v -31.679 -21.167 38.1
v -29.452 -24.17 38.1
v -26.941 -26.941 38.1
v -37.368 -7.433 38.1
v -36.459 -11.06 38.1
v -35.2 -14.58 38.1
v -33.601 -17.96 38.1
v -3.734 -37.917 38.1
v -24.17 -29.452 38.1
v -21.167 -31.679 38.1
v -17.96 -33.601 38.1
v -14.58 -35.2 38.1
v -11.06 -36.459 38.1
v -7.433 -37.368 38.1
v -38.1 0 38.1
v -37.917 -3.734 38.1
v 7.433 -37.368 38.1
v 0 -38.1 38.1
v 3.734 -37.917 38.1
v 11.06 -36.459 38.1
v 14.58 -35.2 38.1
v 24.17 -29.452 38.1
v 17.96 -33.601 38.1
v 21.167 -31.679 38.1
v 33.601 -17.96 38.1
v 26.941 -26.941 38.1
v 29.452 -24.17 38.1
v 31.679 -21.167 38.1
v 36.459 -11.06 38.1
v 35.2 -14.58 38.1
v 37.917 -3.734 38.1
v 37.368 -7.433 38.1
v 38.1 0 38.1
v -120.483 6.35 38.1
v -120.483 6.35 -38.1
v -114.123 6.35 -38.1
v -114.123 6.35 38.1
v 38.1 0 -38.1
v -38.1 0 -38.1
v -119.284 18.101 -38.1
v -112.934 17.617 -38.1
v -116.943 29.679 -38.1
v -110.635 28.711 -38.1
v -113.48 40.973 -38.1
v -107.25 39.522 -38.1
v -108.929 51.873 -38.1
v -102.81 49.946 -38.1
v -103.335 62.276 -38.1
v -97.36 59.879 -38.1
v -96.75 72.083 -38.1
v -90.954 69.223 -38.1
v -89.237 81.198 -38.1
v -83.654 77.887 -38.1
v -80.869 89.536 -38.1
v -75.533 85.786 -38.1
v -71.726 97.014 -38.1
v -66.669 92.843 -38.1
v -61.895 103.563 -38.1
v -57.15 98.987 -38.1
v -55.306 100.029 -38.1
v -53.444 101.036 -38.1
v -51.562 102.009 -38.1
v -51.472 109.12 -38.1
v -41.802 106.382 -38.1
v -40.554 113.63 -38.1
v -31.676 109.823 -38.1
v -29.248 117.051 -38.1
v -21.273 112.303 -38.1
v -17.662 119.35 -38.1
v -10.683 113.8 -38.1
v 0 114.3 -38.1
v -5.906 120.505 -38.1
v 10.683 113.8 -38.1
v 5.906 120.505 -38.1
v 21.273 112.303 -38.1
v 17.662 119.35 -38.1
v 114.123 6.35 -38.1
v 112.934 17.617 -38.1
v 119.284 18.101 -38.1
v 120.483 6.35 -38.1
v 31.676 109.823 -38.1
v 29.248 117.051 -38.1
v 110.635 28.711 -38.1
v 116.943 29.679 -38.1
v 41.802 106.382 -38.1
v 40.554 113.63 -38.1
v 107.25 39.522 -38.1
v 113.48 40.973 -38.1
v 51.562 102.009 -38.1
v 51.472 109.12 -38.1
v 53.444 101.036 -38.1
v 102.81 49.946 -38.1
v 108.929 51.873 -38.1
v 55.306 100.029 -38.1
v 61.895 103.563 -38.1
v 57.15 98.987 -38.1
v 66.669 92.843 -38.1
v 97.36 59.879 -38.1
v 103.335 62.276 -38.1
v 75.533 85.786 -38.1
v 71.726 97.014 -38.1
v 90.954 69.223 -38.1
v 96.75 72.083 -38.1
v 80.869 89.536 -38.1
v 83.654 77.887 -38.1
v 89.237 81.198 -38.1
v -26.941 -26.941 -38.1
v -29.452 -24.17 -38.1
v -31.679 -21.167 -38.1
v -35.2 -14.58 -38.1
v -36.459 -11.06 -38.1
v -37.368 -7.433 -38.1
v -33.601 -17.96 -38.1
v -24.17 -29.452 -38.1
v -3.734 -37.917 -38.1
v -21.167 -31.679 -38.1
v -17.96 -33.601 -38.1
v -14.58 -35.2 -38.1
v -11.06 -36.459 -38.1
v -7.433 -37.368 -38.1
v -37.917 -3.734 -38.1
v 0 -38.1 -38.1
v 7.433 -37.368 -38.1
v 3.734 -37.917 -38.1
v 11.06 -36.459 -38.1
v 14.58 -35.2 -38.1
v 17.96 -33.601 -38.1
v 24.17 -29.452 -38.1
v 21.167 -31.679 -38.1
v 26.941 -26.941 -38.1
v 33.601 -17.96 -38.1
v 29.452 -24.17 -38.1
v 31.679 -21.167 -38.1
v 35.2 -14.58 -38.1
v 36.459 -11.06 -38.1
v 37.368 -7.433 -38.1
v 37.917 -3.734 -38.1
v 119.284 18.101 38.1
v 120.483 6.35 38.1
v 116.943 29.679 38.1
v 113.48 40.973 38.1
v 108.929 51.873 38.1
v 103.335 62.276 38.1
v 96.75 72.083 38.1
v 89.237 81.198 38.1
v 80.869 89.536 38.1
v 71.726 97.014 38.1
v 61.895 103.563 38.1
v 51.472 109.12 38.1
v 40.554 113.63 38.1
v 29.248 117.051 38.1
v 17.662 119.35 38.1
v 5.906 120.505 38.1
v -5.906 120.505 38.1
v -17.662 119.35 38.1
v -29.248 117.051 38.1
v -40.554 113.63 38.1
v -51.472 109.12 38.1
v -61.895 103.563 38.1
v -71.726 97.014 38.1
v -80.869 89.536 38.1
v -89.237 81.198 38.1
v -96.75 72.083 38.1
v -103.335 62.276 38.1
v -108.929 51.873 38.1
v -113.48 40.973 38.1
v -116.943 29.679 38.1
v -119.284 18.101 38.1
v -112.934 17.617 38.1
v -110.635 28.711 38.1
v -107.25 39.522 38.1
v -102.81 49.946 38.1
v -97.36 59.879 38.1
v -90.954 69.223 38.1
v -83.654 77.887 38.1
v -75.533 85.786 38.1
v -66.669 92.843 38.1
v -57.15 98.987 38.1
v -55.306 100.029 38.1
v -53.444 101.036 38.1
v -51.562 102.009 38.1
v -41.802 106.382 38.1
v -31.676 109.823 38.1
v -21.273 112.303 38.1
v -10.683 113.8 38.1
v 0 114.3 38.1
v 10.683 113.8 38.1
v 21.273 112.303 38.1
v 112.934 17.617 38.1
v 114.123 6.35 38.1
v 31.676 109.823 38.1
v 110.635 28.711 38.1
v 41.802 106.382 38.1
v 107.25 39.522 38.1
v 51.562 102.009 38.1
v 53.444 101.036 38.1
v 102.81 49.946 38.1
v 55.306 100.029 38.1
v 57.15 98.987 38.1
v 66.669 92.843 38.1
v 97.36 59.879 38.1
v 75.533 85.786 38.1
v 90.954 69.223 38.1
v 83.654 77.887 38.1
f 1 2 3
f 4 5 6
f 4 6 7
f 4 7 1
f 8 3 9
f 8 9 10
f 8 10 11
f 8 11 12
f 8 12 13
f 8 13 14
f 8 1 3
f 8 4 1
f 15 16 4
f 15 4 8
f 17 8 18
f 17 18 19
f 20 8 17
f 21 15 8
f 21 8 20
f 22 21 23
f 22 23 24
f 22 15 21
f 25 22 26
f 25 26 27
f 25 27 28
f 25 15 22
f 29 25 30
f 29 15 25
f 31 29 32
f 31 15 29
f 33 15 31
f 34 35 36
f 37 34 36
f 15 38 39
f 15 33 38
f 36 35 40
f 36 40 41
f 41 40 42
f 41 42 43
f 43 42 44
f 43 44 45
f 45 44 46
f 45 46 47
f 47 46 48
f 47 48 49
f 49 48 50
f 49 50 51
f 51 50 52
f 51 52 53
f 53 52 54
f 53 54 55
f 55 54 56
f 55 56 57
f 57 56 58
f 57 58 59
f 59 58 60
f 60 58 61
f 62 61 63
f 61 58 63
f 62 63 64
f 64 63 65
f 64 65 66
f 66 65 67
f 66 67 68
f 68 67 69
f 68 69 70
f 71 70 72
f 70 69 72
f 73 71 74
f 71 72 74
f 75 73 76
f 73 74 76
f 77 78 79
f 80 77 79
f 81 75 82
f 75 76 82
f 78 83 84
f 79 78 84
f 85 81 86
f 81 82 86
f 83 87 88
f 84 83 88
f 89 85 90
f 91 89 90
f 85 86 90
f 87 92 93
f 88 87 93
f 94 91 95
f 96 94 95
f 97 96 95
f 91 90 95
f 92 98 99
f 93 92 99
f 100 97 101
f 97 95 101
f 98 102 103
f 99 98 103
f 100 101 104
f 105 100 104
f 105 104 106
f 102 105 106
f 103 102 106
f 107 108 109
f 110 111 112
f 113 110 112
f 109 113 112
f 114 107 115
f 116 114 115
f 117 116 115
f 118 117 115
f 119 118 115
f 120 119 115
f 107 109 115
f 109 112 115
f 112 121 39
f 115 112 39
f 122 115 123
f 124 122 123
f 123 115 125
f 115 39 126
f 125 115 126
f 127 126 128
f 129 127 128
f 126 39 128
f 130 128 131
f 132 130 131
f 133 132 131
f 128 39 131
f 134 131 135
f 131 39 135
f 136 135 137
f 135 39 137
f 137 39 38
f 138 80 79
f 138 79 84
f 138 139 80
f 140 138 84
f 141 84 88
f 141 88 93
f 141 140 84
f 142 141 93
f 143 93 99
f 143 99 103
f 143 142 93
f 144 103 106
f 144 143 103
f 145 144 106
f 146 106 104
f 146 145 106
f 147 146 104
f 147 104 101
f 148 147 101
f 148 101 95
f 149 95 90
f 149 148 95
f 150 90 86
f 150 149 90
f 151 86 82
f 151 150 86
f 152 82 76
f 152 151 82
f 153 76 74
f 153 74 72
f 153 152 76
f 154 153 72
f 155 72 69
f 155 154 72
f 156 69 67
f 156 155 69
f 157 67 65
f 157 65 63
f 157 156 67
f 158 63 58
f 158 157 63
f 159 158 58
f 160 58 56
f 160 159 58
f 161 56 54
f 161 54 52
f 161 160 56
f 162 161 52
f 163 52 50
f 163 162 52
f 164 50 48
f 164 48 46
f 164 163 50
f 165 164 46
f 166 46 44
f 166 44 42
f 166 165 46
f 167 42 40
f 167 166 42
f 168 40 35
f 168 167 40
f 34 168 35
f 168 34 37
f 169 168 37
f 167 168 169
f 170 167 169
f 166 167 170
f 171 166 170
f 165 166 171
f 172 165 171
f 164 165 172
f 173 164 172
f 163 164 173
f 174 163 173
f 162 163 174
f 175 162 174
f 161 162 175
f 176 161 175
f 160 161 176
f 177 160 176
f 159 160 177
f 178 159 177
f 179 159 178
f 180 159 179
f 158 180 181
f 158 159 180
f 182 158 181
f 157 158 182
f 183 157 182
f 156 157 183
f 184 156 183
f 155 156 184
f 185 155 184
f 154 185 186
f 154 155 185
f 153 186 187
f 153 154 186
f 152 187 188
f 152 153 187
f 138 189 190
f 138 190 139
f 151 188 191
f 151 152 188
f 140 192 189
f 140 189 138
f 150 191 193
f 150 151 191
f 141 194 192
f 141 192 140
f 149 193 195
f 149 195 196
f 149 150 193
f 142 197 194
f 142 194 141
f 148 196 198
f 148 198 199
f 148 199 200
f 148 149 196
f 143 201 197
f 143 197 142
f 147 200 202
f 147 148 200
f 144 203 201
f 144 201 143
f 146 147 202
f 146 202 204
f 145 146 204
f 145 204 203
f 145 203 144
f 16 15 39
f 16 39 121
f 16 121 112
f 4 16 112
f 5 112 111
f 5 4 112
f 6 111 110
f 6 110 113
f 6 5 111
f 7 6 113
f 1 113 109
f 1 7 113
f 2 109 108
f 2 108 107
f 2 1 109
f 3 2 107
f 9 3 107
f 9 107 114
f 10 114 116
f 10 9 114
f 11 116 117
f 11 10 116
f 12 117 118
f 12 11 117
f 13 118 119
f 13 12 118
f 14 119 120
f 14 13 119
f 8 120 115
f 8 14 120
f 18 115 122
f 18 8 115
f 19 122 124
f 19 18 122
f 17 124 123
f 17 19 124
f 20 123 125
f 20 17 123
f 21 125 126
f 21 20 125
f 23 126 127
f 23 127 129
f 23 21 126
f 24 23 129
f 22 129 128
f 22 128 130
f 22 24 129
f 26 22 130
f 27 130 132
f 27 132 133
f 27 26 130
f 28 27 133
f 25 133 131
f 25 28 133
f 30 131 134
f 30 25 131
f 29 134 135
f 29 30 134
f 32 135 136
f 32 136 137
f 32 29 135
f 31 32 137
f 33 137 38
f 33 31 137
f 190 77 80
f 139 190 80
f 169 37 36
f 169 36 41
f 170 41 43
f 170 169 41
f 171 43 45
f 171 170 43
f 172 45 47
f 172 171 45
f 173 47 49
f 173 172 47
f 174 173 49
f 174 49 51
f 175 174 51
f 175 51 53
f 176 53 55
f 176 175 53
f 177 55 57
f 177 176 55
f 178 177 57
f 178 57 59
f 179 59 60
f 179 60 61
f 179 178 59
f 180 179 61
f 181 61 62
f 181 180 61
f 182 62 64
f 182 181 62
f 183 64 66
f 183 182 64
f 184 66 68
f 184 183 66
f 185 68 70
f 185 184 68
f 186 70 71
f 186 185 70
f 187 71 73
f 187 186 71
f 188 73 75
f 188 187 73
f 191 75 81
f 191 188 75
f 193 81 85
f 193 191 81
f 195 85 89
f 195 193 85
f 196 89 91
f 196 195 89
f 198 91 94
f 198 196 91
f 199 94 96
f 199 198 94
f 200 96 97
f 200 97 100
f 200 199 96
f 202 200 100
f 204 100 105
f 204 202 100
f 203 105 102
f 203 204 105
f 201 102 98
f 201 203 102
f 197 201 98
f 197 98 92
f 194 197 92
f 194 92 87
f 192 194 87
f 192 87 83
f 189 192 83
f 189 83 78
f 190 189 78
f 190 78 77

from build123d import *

# Parameters (mm, degrees)
F1_DEPTH = 38.1000004709
F2_DEPTH = 38.1


with BuildPart() as f1:
    # F0 (on Top) → F1 (new body, symmetric)
    with BuildSketch(Plane.XY):
        with BuildLine():
            Line((-120.4827820438, 6.3499999233), (-114.1234748024, 6.3499999233))
            ThreePointArc((-114.1234748024, 6.3499999233), (-97.3603641744, 59.878622962), (-57.15, 98.9867036526))
            ThreePointArc((-57.15, 98.9867036526), (-54.3772364315, 100.5365911401), (-51.562474562, 102.0088291132))
            ThreePointArc((-51.562474562, 102.0088291132), (0, 114.3), (51.562474562, 102.0088291132))
            ThreePointArc((51.562474562, 102.0088291132), (54.3772364315, 100.5365911401), (57.15, 98.9867036526))
            ThreePointArc((57.15, 98.9867036526), (97.3603641543, 59.8786229947), (114.1234747981, 6.35))
            Line((114.1234747981, 6.35), (120.4827820397, 6.35))
            ThreePointArc((120.4827820397, 6.35), (-3.84e-08, 120.6500031829), (-120.4827820438, 6.3499999233))
        make_face()
    extrude(amount=F1_DEPTH, both=True)


with BuildPart() as f2:
    # F0 (on Top) → F2 (new body, symmetric)
    with BuildSketch(Plane.XY):
        with BuildLine():
            Line((0, 0), (-19.05, -32.9955678842))
            ThreePointArc((-19.05, -32.9955678842), (0, -38.1), (19.05, -32.9955678842))
            Line((19.05, -32.9955678842), (0, 0))
        make_face()
        with BuildLine():
            Line((38.1, 0), (0, 0))
            Line((0, 0), (19.05, -32.9955678842))
            ThreePointArc((19.05, -32.9955678842), (32.9955678842, -19.05), (38.1, 0))
        make_face()
        with BuildLine():
            Line((0, 0), (-38.1, 0))
            ThreePointArc((-38.1, 0), (-32.9955678842, -19.05), (-19.05, -32.9955678842))
            Line((-19.05, -32.9955678842), (0, 0))
        make_face()
    extrude(amount=F2_DEPTH, both=True)


solid = Compound([f1.part, f2.part])
